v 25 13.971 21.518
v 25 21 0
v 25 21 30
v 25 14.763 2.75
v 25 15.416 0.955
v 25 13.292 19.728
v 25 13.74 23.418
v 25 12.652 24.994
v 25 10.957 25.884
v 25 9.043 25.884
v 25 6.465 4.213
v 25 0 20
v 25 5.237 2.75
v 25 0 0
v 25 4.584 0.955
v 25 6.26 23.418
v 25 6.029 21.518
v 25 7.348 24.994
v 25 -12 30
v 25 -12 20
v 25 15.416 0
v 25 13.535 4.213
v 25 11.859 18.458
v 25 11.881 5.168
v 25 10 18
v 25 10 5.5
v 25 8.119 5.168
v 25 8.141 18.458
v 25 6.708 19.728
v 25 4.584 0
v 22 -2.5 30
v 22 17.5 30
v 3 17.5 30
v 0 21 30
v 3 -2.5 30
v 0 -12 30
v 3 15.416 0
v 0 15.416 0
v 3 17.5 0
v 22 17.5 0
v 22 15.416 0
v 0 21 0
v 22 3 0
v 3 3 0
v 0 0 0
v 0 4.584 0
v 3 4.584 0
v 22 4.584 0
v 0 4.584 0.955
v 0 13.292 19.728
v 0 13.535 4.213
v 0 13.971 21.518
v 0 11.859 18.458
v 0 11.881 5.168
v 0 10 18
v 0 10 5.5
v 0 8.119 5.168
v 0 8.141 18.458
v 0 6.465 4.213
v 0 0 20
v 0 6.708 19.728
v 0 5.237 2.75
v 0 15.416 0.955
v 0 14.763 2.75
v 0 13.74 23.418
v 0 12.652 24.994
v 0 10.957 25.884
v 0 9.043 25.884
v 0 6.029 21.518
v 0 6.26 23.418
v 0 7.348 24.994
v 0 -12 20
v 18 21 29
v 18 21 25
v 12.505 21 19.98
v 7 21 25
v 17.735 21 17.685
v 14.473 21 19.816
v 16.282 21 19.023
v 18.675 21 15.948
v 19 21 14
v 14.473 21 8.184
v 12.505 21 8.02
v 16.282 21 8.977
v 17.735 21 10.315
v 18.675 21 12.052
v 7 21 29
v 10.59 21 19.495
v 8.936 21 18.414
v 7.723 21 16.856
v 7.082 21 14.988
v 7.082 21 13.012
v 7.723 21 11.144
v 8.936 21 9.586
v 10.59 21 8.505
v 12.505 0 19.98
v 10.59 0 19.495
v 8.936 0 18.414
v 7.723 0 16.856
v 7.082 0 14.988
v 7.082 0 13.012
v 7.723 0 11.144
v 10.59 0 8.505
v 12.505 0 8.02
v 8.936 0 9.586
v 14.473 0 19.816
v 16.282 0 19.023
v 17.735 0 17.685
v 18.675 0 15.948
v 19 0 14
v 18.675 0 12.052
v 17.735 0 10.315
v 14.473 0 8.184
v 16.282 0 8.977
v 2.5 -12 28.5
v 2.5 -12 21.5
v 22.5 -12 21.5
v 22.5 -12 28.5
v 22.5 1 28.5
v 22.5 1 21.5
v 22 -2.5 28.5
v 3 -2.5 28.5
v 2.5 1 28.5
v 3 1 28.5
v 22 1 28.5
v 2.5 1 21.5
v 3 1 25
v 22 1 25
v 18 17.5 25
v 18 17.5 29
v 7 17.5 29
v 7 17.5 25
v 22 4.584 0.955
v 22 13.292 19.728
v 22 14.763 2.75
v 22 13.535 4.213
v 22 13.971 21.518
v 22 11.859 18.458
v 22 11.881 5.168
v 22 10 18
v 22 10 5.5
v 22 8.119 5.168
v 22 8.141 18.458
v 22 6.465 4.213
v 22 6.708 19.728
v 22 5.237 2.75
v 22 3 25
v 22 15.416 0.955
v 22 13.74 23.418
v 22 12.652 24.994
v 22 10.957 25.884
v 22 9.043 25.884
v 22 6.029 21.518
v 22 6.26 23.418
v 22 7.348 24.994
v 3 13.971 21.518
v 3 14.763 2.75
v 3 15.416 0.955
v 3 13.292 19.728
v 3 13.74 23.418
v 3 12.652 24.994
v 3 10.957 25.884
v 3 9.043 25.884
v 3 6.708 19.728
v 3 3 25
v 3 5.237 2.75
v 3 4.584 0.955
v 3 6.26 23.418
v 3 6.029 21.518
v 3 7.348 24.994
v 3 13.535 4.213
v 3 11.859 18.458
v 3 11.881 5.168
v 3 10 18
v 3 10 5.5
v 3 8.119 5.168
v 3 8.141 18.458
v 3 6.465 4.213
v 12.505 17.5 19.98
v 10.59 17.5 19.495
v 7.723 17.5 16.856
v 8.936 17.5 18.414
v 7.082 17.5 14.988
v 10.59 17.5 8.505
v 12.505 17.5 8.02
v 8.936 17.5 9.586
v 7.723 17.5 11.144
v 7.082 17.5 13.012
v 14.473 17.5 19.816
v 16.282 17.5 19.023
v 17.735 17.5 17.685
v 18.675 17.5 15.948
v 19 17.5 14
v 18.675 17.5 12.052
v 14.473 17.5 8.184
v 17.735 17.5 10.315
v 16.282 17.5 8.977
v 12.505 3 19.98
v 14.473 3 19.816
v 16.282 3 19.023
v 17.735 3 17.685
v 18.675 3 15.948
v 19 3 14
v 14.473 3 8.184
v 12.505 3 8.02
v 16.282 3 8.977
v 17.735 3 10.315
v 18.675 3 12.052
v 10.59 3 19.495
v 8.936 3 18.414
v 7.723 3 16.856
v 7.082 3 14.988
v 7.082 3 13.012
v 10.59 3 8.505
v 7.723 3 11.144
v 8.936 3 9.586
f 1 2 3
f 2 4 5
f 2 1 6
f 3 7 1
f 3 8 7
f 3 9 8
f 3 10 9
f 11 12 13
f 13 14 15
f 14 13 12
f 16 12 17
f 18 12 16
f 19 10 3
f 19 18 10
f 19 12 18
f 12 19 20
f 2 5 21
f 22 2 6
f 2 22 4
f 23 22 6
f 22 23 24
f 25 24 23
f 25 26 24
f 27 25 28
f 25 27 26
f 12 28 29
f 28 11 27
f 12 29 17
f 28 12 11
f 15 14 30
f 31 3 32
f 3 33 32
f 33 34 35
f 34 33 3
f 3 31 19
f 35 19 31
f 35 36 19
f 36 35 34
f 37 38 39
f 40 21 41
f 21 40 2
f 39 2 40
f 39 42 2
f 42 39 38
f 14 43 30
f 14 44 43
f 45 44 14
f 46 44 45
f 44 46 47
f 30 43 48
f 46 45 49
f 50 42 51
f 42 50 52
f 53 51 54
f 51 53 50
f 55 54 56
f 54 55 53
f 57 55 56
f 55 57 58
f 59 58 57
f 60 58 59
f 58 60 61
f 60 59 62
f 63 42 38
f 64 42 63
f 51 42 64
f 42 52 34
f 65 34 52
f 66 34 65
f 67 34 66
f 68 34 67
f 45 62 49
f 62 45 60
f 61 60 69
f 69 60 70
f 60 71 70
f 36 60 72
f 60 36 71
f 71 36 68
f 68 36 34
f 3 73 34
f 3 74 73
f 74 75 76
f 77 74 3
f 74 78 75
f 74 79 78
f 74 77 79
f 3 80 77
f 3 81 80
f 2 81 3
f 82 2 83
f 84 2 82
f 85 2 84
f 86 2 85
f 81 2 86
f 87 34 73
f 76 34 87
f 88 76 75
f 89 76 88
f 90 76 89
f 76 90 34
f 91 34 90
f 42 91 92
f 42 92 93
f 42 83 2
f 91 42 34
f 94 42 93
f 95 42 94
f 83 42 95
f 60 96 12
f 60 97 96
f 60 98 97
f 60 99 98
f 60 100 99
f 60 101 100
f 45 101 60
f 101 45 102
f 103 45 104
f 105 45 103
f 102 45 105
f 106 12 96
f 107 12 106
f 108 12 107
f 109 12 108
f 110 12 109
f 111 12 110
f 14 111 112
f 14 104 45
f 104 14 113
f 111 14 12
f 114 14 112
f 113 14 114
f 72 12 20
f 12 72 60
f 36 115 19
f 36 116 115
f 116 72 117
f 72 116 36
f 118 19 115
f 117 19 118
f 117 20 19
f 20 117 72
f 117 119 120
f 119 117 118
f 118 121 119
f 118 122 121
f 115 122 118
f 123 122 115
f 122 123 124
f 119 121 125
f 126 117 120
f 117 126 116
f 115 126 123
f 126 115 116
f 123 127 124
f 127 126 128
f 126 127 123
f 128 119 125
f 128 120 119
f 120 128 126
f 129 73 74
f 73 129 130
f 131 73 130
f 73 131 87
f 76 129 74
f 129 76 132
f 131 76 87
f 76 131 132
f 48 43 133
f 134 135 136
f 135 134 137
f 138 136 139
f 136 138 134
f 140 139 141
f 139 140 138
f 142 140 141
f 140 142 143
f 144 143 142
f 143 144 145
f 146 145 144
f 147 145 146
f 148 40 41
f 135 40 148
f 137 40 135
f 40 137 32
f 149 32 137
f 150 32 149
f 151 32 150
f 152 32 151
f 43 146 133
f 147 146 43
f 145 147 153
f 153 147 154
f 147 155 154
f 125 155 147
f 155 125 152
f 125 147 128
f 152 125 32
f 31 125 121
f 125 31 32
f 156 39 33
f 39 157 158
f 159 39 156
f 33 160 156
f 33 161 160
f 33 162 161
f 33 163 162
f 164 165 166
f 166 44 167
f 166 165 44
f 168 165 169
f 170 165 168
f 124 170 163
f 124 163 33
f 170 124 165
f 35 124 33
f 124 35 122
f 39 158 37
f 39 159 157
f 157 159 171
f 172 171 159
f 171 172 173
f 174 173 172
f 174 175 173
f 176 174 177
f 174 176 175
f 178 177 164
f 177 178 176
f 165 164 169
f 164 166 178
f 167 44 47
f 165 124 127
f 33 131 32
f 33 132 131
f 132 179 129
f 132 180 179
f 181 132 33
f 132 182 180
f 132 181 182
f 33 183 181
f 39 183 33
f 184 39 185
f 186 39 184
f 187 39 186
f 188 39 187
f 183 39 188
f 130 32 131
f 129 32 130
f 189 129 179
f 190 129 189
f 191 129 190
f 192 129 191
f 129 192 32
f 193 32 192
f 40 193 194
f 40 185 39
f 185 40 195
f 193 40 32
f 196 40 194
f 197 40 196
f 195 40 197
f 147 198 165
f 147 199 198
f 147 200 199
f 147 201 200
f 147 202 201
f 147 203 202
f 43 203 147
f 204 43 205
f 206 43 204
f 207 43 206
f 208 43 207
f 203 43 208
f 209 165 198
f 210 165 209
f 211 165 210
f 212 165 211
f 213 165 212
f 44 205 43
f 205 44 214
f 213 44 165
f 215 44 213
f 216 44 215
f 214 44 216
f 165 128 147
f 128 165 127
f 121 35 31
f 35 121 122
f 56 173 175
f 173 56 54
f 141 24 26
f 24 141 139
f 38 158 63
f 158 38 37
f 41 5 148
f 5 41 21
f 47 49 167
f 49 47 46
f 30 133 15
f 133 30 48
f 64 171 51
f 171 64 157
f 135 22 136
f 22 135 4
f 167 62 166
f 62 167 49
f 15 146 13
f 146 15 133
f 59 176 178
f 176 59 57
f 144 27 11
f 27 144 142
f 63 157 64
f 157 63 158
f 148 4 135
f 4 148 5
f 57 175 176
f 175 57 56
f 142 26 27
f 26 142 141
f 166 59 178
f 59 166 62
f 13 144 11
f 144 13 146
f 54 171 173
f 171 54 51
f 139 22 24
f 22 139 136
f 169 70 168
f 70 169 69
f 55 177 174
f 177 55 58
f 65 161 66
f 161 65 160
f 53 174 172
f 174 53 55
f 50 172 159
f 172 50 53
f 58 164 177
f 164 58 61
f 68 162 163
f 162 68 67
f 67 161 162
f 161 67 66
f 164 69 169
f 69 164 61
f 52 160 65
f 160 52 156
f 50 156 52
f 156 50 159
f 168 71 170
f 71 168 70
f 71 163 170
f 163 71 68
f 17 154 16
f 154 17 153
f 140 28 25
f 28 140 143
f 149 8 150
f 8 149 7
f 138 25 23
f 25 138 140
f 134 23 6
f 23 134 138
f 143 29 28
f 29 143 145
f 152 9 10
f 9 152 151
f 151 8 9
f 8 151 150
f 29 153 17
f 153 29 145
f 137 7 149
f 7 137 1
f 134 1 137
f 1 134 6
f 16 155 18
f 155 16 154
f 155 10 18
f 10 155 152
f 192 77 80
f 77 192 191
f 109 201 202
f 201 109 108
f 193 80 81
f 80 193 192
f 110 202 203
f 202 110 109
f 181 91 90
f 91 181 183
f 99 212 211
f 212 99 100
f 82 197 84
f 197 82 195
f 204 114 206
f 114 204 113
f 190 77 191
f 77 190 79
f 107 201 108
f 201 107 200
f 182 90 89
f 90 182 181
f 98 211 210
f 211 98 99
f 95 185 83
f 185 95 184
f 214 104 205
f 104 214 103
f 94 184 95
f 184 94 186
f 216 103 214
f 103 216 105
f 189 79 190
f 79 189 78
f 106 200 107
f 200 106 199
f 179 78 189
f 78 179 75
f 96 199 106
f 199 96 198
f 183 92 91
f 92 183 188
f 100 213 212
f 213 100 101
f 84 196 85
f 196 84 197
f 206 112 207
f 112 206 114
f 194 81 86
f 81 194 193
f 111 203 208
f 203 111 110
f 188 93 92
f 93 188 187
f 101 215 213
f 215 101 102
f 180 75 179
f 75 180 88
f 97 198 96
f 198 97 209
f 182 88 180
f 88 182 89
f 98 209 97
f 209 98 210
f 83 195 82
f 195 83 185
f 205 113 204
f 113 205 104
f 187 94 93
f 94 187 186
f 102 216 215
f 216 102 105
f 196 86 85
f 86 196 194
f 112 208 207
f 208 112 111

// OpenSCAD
//union(){    
difference() {
    union(){
	cube([25, 21, 30]);
    translate([0,-12,20]) cube([25, 12, 10]);
    }
    union(){
	union()  union(){{
	translate([3, 3, 0]) cube([19, 14.5, 28]);
	translate([3, -2.5, 25]) cube([19, 20, 5]);
}
union(){
translate([2.5,-12,21.5])cube([20, 13, 7]); 
 translate([7,17,25])cube([11, 4, 4]); 
}
}
translate([10,10,0])rotate([0, 90, 0]) cylinder(h = 33, r = 5.5, center = true);
}
	union() translate([13, 2, 14]) {
	rotate([90, 0, 0]) cylinder(h = 38, r = 6, center = true);
	union() {
		translate([-12, 8, 8]) rotate([0, 90, 0]) cylinder(h = 4, r = 4, center = true);
		translate([11, 8, 8]) rotate([0, 90, 0]) cylinder(h = 4, r = 4, center = true);
	}
}
}
//translate([13,11,13])rotate([90, 0, 0]) difference(){cylinder(h = 16, r = 6.4, center = true);
//    cylinder(h = 16, r = 5.6, center = true);}
//
//}
